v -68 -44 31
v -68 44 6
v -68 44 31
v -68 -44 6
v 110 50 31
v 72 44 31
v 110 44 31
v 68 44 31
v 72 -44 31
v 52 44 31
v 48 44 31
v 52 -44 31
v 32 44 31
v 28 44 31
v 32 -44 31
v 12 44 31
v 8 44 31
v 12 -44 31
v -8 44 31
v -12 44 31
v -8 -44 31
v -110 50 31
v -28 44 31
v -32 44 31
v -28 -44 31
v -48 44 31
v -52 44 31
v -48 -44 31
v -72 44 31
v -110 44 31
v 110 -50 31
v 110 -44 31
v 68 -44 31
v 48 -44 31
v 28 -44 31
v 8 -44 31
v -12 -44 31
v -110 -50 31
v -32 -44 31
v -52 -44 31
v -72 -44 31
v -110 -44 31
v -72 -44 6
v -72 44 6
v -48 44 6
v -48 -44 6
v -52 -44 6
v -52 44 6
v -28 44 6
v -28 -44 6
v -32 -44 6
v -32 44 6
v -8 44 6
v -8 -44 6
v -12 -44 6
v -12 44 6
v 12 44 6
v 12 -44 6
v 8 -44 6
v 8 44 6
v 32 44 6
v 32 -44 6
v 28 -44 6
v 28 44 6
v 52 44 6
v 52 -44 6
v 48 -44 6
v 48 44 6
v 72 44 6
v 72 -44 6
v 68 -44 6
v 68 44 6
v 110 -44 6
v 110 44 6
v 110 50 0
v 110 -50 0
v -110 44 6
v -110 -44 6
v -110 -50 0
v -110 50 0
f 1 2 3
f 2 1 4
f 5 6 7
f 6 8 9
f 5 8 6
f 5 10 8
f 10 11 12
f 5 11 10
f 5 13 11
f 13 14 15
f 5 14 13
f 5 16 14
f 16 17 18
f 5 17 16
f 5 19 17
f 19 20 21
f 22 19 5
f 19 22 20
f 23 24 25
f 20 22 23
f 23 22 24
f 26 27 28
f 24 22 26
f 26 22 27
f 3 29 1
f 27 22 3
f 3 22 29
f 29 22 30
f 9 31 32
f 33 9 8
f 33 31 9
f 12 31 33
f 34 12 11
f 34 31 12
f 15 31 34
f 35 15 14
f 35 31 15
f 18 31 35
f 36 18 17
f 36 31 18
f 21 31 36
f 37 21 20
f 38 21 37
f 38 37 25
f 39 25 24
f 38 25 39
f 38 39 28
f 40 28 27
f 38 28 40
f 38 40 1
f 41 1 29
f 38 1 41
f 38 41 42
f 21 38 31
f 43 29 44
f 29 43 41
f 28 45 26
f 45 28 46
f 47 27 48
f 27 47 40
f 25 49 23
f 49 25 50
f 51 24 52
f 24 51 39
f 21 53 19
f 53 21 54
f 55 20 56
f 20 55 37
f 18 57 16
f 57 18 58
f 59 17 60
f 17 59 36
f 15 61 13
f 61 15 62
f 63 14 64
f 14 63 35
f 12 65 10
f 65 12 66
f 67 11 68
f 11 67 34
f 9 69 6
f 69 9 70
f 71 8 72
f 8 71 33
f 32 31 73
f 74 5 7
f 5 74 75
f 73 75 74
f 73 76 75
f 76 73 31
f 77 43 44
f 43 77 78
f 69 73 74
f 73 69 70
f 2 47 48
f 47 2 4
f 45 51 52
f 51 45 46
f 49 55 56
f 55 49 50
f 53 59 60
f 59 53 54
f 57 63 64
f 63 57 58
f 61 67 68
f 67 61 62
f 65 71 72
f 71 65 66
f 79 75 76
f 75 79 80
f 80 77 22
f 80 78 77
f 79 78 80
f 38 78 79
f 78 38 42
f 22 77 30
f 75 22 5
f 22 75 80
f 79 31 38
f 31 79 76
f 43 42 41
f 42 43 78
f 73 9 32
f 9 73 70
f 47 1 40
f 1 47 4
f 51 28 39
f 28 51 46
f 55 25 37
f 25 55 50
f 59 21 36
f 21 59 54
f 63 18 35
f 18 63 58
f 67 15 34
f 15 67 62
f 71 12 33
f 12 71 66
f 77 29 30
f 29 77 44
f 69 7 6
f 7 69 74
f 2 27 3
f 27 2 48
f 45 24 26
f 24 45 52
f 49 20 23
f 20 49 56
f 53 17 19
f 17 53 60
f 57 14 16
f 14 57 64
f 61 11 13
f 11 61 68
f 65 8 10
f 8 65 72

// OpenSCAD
$fn = 32;

// ----------------------------------------------------------------------
// Rib frame 220 x 100 x 31
// 8 ribs at 20 mm pitch
// ----------------------------------------------------------------------

// --- parameters (mm) ---
frame = [220, 100, 6];  // base plate size (x, y, z)
rail_w = 6;             // side rail width
ribs = 8;               // number of ribs
rib_t = 4;              // rib thickness
rib_h = 25;             // rib height above the base plate
pitch = 20;             // pitch between rib centres

// --- derived feature positions (mm) ---
span = (ribs - 1) * pitch;          // = 140   distance between the outer ribs
origin_x = -span / 2;               // = -70   X of the first rib
rib_len = frame[1] - 2 * rail_w + 2;  // = 90   rib length, 1 mm into each rail
feature_centers = [
  [origin_x + 0 * pitch, 0],
  [origin_x + 1 * pitch, 0],
  [origin_x + 2 * pitch, 0],
  [origin_x + 3 * pitch, 0],
  [origin_x + 4 * pitch, 0],
  [origin_x + 5 * pitch, 0],
  [origin_x + 6 * pitch, 0],
  [origin_x + 7 * pitch, 0]
];   // rib centre line, drives the rib loop

// base plate, two side rails, then the ribs read straight off feature_centers
union() {
  translate([-frame[0] / 2, -frame[1] / 2, 0]) cube(frame);
  translate([-frame[0] / 2, -frame[1] / 2, 0]) cube([frame[0], rail_w, frame[2] + rib_h]);
  translate([-frame[0] / 2, frame[1] / 2 - rail_w, 0]) cube([frame[0], rail_w, frame[2] + rib_h]);
  for (centre = feature_centers)
    translate([centre[0] - rib_t / 2, centre[1] - rib_len / 2, frame[2] - 1])
      cube([rib_t, rib_len, rib_h + 1]);
}
